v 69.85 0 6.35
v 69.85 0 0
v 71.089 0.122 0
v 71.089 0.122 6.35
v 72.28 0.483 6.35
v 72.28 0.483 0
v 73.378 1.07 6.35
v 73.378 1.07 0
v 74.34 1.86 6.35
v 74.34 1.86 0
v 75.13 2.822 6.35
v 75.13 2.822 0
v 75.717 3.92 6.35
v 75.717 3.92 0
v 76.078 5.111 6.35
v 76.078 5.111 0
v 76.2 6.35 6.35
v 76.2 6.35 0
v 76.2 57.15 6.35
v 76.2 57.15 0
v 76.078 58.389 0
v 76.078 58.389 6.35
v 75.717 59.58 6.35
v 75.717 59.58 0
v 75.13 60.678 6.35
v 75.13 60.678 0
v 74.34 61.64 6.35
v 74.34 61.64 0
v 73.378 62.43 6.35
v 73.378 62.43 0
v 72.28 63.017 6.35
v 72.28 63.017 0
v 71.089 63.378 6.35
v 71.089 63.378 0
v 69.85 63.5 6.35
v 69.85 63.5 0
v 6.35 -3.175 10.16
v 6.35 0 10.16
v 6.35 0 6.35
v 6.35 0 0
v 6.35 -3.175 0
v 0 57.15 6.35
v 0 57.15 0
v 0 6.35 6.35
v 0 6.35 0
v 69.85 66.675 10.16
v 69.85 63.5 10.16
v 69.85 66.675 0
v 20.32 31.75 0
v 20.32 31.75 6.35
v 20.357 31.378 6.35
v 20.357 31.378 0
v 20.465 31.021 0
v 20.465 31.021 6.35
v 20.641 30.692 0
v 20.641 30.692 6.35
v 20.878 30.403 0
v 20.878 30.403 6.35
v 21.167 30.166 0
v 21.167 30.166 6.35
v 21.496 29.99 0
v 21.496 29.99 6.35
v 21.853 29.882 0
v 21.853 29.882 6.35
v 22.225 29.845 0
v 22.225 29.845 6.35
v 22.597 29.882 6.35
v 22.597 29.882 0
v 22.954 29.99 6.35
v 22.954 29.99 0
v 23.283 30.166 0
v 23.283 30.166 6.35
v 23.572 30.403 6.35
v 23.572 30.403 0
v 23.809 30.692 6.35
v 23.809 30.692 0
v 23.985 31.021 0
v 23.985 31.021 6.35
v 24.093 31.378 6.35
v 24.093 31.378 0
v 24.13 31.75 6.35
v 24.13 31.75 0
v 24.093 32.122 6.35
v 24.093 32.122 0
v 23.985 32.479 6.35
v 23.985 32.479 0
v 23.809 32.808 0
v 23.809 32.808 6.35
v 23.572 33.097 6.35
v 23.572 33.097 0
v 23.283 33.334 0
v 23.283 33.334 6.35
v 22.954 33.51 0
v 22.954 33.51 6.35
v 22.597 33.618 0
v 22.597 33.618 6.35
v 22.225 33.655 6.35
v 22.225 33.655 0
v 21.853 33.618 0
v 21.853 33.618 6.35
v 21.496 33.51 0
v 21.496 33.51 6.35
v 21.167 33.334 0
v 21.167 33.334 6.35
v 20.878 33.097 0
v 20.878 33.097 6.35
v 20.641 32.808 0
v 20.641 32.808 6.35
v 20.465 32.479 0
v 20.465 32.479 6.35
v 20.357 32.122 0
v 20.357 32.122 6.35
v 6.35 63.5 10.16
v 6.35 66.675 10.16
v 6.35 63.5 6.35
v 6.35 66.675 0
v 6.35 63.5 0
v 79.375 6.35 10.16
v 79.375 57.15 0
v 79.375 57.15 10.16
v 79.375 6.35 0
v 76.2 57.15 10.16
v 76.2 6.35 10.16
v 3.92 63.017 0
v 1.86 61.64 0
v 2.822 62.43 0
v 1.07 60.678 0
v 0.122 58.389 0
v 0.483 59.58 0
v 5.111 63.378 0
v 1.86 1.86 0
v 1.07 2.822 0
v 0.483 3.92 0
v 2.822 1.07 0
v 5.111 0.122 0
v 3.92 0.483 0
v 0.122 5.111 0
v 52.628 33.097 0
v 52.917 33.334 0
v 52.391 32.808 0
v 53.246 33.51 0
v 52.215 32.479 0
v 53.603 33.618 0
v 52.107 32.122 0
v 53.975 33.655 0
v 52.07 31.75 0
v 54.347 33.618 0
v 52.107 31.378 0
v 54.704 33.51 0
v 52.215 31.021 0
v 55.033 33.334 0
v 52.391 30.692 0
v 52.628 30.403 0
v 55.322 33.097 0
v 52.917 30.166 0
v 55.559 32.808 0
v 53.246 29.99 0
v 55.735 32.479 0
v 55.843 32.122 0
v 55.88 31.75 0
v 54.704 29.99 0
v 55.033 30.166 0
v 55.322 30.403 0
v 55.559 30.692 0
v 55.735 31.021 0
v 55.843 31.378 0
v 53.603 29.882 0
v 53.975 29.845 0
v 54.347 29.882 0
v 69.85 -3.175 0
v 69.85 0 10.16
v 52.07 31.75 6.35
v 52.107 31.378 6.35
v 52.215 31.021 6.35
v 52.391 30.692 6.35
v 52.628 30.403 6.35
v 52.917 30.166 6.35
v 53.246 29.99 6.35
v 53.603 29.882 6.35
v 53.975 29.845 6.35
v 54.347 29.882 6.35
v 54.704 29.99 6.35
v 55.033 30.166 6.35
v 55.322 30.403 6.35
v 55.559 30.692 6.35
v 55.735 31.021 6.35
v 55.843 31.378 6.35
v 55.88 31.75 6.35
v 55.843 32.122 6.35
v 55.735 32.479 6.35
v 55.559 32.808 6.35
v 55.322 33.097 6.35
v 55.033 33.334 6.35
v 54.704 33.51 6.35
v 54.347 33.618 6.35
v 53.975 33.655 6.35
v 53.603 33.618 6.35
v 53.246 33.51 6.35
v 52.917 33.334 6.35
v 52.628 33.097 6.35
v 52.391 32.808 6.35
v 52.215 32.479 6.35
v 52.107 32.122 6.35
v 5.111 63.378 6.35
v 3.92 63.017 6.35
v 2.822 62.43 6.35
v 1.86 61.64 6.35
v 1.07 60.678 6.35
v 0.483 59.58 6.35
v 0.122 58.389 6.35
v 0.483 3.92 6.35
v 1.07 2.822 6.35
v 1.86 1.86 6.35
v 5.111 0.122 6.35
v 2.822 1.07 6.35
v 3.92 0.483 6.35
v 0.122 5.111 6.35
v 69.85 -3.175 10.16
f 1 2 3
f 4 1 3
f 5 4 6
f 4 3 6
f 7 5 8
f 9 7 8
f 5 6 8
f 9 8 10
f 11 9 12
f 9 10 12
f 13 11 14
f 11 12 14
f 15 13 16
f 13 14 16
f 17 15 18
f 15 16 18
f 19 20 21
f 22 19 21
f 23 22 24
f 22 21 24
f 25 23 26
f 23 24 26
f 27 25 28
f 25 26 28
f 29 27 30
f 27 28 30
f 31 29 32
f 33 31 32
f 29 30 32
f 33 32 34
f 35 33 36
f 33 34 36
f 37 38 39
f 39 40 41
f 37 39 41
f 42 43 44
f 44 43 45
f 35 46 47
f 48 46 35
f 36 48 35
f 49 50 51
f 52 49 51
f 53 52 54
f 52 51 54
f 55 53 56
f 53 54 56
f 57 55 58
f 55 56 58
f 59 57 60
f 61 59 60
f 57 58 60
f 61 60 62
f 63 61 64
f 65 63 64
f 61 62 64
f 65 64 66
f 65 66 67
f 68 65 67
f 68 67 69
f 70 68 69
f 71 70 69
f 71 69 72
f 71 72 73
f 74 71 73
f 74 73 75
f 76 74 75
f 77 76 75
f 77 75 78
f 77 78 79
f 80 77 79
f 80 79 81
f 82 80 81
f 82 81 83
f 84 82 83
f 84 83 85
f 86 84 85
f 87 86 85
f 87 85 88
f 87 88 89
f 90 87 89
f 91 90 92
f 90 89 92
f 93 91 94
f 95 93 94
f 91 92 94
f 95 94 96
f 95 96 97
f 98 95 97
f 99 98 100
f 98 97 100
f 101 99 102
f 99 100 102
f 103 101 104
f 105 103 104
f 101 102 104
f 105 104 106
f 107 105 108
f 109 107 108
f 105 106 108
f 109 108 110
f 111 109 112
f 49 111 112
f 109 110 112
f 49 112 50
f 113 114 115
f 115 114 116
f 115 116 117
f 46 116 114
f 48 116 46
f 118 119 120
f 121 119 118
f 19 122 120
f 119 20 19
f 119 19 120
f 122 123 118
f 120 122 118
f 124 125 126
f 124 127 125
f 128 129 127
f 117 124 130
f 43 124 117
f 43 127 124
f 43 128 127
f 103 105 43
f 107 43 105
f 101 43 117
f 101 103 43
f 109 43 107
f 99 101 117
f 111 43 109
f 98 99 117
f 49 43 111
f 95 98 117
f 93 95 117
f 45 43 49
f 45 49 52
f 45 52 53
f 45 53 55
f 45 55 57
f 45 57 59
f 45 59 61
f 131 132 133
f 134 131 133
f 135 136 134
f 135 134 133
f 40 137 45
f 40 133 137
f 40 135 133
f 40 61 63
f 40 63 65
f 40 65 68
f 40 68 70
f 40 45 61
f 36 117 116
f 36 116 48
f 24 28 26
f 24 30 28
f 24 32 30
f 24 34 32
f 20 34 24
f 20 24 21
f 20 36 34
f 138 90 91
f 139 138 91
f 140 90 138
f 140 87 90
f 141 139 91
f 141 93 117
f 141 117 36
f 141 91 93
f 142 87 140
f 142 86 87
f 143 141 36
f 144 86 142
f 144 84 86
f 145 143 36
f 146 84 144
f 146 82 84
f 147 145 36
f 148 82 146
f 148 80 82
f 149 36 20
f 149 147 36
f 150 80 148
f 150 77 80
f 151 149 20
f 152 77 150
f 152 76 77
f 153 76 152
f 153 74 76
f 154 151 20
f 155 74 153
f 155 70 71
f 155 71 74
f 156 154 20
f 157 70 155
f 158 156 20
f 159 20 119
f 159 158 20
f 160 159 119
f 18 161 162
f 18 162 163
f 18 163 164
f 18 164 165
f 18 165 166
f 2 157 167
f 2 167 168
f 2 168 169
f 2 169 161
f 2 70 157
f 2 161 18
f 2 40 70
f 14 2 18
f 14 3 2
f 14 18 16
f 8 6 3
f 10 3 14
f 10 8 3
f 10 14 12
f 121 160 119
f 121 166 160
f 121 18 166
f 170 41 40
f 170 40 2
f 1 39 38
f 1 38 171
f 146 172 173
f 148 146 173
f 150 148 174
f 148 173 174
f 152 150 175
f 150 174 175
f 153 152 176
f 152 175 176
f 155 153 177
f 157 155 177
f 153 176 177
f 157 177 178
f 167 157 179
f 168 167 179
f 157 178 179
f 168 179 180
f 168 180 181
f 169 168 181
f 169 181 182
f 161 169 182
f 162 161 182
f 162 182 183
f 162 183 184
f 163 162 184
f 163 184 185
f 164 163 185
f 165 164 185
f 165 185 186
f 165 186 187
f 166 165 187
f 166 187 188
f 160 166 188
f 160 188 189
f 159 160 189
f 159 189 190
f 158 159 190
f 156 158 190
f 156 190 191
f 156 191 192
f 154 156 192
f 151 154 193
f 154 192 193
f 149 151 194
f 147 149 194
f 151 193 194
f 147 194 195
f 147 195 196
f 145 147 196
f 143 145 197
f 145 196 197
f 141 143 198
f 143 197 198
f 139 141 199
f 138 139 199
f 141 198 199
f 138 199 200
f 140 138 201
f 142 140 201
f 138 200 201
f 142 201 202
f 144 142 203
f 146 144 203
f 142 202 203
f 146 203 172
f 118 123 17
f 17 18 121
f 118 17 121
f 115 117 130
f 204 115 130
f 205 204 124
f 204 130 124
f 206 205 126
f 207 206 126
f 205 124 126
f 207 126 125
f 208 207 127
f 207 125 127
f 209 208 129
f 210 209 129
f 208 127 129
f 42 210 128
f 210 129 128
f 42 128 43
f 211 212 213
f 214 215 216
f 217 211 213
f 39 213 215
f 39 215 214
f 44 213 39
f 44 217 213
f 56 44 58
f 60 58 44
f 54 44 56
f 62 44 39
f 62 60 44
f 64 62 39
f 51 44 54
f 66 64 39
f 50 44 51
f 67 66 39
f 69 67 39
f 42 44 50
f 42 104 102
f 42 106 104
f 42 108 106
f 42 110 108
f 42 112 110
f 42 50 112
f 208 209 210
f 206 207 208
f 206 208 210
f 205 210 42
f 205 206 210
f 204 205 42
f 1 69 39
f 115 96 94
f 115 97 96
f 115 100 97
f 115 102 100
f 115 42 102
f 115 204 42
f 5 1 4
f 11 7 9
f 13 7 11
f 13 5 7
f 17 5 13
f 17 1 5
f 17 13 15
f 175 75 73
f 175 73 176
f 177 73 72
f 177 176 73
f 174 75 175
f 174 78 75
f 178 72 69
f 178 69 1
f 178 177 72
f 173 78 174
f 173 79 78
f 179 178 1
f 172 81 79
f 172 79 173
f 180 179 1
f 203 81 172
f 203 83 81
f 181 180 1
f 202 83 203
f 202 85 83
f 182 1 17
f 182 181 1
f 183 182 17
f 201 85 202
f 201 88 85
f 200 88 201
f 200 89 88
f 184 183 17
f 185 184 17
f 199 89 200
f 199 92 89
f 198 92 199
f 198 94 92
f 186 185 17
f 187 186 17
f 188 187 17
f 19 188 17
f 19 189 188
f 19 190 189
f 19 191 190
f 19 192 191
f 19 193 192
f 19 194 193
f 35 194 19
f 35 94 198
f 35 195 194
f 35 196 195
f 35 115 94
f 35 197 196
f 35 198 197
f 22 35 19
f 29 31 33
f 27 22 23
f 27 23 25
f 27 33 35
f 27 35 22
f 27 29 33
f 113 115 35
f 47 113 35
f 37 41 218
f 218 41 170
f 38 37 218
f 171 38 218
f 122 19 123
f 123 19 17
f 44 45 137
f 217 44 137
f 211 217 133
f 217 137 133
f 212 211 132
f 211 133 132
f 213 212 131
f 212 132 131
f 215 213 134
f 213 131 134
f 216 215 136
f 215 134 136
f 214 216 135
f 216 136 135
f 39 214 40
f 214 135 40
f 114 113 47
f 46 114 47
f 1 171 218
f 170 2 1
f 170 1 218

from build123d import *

# Parameters (mm, degrees)
F1_DEPTH = 6.35
F3_DEPTH = 6.351
F4_W     = 63.5
F4_H     = 3.175
F4_W_2   = 3.175
F4_H_2   = 50.8
F5_DEPTH = 10.16


with BuildPart() as f1:
    # F0 (on Top) → F1 (new body)
    with BuildSketch(Plane.XY):
        with BuildLine():
            ThreePointArc((0, 6.35), (1.859872, 1.859872), (6.35, 0))
            Line((6.35, 0), (69.85, 0))
            ThreePointArc((69.85, 0), (74.340128, 1.859872), (76.2, 6.35))
            Line((76.2, 6.35), (76.2, 57.15))
            ThreePointArc((76.2, 57.15), (74.340128, 61.640128), (69.85, 63.5))
            Line((69.85, 63.5), (6.35, 63.5))
            ThreePointArc((6.35, 63.5), (1.859872, 61.640128), (0, 57.15))
            Line((0, 57.15), (0, 6.35))
        make_face()
    extrude(amount=F1_DEPTH)

    # F2 (on face) → F3 (cut, through all)
    with BuildSketch(Plane.XY.offset(6.35)):
        with BuildLine():
            ThreePointArc((24.13, 31.75), (22.225, 33.655), (20.32, 31.75))
            Line((20.32, 31.75), (22.225, 31.75))
            Line((22.225, 31.75), (24.13, 31.75))
        make_face()
        with BuildLine():
            ThreePointArc((55.88, 31.75), (53.975, 33.655), (52.07, 31.75))
            Line((52.07, 31.75), (53.975, 31.75))
            Line((53.975, 31.75), (55.88, 31.75))
        make_face()
        with BuildLine():
            Line((53.975, 31.75), (52.07, 31.75))
            ThreePointArc((52.07, 31.75), (53.975, 29.845), (55.88, 31.75))
            Line((55.88, 31.75), (53.975, 31.75))
        make_face()
        with BuildLine():
            Line((22.225, 31.75), (20.32, 31.75))
            ThreePointArc((20.32, 31.75), (22.225, 29.845), (24.13, 31.75))
            Line((24.13, 31.75), (22.225, 31.75))
        make_face()
    extrude(amount=-F3_DEPTH, mode=Mode.SUBTRACT)

    # F4 (on face) → F5 (join)
    with BuildSketch(Plane(origin=(0, 0, 0), x_dir=(1, 0, 0), z_dir=(0, 0, -1))):
        with Locations((38.1, 1.5875)):
            Rectangle(F4_W, F4_H)
        with Locations((77.7875, -31.75)):
            Rectangle(F4_W_2, F4_H_2)
        with Locations((38.1, -65.0875)):
            Rectangle(F4_W, F4_H)
    extrude(amount=-F5_DEPTH)


solid = f1.part
